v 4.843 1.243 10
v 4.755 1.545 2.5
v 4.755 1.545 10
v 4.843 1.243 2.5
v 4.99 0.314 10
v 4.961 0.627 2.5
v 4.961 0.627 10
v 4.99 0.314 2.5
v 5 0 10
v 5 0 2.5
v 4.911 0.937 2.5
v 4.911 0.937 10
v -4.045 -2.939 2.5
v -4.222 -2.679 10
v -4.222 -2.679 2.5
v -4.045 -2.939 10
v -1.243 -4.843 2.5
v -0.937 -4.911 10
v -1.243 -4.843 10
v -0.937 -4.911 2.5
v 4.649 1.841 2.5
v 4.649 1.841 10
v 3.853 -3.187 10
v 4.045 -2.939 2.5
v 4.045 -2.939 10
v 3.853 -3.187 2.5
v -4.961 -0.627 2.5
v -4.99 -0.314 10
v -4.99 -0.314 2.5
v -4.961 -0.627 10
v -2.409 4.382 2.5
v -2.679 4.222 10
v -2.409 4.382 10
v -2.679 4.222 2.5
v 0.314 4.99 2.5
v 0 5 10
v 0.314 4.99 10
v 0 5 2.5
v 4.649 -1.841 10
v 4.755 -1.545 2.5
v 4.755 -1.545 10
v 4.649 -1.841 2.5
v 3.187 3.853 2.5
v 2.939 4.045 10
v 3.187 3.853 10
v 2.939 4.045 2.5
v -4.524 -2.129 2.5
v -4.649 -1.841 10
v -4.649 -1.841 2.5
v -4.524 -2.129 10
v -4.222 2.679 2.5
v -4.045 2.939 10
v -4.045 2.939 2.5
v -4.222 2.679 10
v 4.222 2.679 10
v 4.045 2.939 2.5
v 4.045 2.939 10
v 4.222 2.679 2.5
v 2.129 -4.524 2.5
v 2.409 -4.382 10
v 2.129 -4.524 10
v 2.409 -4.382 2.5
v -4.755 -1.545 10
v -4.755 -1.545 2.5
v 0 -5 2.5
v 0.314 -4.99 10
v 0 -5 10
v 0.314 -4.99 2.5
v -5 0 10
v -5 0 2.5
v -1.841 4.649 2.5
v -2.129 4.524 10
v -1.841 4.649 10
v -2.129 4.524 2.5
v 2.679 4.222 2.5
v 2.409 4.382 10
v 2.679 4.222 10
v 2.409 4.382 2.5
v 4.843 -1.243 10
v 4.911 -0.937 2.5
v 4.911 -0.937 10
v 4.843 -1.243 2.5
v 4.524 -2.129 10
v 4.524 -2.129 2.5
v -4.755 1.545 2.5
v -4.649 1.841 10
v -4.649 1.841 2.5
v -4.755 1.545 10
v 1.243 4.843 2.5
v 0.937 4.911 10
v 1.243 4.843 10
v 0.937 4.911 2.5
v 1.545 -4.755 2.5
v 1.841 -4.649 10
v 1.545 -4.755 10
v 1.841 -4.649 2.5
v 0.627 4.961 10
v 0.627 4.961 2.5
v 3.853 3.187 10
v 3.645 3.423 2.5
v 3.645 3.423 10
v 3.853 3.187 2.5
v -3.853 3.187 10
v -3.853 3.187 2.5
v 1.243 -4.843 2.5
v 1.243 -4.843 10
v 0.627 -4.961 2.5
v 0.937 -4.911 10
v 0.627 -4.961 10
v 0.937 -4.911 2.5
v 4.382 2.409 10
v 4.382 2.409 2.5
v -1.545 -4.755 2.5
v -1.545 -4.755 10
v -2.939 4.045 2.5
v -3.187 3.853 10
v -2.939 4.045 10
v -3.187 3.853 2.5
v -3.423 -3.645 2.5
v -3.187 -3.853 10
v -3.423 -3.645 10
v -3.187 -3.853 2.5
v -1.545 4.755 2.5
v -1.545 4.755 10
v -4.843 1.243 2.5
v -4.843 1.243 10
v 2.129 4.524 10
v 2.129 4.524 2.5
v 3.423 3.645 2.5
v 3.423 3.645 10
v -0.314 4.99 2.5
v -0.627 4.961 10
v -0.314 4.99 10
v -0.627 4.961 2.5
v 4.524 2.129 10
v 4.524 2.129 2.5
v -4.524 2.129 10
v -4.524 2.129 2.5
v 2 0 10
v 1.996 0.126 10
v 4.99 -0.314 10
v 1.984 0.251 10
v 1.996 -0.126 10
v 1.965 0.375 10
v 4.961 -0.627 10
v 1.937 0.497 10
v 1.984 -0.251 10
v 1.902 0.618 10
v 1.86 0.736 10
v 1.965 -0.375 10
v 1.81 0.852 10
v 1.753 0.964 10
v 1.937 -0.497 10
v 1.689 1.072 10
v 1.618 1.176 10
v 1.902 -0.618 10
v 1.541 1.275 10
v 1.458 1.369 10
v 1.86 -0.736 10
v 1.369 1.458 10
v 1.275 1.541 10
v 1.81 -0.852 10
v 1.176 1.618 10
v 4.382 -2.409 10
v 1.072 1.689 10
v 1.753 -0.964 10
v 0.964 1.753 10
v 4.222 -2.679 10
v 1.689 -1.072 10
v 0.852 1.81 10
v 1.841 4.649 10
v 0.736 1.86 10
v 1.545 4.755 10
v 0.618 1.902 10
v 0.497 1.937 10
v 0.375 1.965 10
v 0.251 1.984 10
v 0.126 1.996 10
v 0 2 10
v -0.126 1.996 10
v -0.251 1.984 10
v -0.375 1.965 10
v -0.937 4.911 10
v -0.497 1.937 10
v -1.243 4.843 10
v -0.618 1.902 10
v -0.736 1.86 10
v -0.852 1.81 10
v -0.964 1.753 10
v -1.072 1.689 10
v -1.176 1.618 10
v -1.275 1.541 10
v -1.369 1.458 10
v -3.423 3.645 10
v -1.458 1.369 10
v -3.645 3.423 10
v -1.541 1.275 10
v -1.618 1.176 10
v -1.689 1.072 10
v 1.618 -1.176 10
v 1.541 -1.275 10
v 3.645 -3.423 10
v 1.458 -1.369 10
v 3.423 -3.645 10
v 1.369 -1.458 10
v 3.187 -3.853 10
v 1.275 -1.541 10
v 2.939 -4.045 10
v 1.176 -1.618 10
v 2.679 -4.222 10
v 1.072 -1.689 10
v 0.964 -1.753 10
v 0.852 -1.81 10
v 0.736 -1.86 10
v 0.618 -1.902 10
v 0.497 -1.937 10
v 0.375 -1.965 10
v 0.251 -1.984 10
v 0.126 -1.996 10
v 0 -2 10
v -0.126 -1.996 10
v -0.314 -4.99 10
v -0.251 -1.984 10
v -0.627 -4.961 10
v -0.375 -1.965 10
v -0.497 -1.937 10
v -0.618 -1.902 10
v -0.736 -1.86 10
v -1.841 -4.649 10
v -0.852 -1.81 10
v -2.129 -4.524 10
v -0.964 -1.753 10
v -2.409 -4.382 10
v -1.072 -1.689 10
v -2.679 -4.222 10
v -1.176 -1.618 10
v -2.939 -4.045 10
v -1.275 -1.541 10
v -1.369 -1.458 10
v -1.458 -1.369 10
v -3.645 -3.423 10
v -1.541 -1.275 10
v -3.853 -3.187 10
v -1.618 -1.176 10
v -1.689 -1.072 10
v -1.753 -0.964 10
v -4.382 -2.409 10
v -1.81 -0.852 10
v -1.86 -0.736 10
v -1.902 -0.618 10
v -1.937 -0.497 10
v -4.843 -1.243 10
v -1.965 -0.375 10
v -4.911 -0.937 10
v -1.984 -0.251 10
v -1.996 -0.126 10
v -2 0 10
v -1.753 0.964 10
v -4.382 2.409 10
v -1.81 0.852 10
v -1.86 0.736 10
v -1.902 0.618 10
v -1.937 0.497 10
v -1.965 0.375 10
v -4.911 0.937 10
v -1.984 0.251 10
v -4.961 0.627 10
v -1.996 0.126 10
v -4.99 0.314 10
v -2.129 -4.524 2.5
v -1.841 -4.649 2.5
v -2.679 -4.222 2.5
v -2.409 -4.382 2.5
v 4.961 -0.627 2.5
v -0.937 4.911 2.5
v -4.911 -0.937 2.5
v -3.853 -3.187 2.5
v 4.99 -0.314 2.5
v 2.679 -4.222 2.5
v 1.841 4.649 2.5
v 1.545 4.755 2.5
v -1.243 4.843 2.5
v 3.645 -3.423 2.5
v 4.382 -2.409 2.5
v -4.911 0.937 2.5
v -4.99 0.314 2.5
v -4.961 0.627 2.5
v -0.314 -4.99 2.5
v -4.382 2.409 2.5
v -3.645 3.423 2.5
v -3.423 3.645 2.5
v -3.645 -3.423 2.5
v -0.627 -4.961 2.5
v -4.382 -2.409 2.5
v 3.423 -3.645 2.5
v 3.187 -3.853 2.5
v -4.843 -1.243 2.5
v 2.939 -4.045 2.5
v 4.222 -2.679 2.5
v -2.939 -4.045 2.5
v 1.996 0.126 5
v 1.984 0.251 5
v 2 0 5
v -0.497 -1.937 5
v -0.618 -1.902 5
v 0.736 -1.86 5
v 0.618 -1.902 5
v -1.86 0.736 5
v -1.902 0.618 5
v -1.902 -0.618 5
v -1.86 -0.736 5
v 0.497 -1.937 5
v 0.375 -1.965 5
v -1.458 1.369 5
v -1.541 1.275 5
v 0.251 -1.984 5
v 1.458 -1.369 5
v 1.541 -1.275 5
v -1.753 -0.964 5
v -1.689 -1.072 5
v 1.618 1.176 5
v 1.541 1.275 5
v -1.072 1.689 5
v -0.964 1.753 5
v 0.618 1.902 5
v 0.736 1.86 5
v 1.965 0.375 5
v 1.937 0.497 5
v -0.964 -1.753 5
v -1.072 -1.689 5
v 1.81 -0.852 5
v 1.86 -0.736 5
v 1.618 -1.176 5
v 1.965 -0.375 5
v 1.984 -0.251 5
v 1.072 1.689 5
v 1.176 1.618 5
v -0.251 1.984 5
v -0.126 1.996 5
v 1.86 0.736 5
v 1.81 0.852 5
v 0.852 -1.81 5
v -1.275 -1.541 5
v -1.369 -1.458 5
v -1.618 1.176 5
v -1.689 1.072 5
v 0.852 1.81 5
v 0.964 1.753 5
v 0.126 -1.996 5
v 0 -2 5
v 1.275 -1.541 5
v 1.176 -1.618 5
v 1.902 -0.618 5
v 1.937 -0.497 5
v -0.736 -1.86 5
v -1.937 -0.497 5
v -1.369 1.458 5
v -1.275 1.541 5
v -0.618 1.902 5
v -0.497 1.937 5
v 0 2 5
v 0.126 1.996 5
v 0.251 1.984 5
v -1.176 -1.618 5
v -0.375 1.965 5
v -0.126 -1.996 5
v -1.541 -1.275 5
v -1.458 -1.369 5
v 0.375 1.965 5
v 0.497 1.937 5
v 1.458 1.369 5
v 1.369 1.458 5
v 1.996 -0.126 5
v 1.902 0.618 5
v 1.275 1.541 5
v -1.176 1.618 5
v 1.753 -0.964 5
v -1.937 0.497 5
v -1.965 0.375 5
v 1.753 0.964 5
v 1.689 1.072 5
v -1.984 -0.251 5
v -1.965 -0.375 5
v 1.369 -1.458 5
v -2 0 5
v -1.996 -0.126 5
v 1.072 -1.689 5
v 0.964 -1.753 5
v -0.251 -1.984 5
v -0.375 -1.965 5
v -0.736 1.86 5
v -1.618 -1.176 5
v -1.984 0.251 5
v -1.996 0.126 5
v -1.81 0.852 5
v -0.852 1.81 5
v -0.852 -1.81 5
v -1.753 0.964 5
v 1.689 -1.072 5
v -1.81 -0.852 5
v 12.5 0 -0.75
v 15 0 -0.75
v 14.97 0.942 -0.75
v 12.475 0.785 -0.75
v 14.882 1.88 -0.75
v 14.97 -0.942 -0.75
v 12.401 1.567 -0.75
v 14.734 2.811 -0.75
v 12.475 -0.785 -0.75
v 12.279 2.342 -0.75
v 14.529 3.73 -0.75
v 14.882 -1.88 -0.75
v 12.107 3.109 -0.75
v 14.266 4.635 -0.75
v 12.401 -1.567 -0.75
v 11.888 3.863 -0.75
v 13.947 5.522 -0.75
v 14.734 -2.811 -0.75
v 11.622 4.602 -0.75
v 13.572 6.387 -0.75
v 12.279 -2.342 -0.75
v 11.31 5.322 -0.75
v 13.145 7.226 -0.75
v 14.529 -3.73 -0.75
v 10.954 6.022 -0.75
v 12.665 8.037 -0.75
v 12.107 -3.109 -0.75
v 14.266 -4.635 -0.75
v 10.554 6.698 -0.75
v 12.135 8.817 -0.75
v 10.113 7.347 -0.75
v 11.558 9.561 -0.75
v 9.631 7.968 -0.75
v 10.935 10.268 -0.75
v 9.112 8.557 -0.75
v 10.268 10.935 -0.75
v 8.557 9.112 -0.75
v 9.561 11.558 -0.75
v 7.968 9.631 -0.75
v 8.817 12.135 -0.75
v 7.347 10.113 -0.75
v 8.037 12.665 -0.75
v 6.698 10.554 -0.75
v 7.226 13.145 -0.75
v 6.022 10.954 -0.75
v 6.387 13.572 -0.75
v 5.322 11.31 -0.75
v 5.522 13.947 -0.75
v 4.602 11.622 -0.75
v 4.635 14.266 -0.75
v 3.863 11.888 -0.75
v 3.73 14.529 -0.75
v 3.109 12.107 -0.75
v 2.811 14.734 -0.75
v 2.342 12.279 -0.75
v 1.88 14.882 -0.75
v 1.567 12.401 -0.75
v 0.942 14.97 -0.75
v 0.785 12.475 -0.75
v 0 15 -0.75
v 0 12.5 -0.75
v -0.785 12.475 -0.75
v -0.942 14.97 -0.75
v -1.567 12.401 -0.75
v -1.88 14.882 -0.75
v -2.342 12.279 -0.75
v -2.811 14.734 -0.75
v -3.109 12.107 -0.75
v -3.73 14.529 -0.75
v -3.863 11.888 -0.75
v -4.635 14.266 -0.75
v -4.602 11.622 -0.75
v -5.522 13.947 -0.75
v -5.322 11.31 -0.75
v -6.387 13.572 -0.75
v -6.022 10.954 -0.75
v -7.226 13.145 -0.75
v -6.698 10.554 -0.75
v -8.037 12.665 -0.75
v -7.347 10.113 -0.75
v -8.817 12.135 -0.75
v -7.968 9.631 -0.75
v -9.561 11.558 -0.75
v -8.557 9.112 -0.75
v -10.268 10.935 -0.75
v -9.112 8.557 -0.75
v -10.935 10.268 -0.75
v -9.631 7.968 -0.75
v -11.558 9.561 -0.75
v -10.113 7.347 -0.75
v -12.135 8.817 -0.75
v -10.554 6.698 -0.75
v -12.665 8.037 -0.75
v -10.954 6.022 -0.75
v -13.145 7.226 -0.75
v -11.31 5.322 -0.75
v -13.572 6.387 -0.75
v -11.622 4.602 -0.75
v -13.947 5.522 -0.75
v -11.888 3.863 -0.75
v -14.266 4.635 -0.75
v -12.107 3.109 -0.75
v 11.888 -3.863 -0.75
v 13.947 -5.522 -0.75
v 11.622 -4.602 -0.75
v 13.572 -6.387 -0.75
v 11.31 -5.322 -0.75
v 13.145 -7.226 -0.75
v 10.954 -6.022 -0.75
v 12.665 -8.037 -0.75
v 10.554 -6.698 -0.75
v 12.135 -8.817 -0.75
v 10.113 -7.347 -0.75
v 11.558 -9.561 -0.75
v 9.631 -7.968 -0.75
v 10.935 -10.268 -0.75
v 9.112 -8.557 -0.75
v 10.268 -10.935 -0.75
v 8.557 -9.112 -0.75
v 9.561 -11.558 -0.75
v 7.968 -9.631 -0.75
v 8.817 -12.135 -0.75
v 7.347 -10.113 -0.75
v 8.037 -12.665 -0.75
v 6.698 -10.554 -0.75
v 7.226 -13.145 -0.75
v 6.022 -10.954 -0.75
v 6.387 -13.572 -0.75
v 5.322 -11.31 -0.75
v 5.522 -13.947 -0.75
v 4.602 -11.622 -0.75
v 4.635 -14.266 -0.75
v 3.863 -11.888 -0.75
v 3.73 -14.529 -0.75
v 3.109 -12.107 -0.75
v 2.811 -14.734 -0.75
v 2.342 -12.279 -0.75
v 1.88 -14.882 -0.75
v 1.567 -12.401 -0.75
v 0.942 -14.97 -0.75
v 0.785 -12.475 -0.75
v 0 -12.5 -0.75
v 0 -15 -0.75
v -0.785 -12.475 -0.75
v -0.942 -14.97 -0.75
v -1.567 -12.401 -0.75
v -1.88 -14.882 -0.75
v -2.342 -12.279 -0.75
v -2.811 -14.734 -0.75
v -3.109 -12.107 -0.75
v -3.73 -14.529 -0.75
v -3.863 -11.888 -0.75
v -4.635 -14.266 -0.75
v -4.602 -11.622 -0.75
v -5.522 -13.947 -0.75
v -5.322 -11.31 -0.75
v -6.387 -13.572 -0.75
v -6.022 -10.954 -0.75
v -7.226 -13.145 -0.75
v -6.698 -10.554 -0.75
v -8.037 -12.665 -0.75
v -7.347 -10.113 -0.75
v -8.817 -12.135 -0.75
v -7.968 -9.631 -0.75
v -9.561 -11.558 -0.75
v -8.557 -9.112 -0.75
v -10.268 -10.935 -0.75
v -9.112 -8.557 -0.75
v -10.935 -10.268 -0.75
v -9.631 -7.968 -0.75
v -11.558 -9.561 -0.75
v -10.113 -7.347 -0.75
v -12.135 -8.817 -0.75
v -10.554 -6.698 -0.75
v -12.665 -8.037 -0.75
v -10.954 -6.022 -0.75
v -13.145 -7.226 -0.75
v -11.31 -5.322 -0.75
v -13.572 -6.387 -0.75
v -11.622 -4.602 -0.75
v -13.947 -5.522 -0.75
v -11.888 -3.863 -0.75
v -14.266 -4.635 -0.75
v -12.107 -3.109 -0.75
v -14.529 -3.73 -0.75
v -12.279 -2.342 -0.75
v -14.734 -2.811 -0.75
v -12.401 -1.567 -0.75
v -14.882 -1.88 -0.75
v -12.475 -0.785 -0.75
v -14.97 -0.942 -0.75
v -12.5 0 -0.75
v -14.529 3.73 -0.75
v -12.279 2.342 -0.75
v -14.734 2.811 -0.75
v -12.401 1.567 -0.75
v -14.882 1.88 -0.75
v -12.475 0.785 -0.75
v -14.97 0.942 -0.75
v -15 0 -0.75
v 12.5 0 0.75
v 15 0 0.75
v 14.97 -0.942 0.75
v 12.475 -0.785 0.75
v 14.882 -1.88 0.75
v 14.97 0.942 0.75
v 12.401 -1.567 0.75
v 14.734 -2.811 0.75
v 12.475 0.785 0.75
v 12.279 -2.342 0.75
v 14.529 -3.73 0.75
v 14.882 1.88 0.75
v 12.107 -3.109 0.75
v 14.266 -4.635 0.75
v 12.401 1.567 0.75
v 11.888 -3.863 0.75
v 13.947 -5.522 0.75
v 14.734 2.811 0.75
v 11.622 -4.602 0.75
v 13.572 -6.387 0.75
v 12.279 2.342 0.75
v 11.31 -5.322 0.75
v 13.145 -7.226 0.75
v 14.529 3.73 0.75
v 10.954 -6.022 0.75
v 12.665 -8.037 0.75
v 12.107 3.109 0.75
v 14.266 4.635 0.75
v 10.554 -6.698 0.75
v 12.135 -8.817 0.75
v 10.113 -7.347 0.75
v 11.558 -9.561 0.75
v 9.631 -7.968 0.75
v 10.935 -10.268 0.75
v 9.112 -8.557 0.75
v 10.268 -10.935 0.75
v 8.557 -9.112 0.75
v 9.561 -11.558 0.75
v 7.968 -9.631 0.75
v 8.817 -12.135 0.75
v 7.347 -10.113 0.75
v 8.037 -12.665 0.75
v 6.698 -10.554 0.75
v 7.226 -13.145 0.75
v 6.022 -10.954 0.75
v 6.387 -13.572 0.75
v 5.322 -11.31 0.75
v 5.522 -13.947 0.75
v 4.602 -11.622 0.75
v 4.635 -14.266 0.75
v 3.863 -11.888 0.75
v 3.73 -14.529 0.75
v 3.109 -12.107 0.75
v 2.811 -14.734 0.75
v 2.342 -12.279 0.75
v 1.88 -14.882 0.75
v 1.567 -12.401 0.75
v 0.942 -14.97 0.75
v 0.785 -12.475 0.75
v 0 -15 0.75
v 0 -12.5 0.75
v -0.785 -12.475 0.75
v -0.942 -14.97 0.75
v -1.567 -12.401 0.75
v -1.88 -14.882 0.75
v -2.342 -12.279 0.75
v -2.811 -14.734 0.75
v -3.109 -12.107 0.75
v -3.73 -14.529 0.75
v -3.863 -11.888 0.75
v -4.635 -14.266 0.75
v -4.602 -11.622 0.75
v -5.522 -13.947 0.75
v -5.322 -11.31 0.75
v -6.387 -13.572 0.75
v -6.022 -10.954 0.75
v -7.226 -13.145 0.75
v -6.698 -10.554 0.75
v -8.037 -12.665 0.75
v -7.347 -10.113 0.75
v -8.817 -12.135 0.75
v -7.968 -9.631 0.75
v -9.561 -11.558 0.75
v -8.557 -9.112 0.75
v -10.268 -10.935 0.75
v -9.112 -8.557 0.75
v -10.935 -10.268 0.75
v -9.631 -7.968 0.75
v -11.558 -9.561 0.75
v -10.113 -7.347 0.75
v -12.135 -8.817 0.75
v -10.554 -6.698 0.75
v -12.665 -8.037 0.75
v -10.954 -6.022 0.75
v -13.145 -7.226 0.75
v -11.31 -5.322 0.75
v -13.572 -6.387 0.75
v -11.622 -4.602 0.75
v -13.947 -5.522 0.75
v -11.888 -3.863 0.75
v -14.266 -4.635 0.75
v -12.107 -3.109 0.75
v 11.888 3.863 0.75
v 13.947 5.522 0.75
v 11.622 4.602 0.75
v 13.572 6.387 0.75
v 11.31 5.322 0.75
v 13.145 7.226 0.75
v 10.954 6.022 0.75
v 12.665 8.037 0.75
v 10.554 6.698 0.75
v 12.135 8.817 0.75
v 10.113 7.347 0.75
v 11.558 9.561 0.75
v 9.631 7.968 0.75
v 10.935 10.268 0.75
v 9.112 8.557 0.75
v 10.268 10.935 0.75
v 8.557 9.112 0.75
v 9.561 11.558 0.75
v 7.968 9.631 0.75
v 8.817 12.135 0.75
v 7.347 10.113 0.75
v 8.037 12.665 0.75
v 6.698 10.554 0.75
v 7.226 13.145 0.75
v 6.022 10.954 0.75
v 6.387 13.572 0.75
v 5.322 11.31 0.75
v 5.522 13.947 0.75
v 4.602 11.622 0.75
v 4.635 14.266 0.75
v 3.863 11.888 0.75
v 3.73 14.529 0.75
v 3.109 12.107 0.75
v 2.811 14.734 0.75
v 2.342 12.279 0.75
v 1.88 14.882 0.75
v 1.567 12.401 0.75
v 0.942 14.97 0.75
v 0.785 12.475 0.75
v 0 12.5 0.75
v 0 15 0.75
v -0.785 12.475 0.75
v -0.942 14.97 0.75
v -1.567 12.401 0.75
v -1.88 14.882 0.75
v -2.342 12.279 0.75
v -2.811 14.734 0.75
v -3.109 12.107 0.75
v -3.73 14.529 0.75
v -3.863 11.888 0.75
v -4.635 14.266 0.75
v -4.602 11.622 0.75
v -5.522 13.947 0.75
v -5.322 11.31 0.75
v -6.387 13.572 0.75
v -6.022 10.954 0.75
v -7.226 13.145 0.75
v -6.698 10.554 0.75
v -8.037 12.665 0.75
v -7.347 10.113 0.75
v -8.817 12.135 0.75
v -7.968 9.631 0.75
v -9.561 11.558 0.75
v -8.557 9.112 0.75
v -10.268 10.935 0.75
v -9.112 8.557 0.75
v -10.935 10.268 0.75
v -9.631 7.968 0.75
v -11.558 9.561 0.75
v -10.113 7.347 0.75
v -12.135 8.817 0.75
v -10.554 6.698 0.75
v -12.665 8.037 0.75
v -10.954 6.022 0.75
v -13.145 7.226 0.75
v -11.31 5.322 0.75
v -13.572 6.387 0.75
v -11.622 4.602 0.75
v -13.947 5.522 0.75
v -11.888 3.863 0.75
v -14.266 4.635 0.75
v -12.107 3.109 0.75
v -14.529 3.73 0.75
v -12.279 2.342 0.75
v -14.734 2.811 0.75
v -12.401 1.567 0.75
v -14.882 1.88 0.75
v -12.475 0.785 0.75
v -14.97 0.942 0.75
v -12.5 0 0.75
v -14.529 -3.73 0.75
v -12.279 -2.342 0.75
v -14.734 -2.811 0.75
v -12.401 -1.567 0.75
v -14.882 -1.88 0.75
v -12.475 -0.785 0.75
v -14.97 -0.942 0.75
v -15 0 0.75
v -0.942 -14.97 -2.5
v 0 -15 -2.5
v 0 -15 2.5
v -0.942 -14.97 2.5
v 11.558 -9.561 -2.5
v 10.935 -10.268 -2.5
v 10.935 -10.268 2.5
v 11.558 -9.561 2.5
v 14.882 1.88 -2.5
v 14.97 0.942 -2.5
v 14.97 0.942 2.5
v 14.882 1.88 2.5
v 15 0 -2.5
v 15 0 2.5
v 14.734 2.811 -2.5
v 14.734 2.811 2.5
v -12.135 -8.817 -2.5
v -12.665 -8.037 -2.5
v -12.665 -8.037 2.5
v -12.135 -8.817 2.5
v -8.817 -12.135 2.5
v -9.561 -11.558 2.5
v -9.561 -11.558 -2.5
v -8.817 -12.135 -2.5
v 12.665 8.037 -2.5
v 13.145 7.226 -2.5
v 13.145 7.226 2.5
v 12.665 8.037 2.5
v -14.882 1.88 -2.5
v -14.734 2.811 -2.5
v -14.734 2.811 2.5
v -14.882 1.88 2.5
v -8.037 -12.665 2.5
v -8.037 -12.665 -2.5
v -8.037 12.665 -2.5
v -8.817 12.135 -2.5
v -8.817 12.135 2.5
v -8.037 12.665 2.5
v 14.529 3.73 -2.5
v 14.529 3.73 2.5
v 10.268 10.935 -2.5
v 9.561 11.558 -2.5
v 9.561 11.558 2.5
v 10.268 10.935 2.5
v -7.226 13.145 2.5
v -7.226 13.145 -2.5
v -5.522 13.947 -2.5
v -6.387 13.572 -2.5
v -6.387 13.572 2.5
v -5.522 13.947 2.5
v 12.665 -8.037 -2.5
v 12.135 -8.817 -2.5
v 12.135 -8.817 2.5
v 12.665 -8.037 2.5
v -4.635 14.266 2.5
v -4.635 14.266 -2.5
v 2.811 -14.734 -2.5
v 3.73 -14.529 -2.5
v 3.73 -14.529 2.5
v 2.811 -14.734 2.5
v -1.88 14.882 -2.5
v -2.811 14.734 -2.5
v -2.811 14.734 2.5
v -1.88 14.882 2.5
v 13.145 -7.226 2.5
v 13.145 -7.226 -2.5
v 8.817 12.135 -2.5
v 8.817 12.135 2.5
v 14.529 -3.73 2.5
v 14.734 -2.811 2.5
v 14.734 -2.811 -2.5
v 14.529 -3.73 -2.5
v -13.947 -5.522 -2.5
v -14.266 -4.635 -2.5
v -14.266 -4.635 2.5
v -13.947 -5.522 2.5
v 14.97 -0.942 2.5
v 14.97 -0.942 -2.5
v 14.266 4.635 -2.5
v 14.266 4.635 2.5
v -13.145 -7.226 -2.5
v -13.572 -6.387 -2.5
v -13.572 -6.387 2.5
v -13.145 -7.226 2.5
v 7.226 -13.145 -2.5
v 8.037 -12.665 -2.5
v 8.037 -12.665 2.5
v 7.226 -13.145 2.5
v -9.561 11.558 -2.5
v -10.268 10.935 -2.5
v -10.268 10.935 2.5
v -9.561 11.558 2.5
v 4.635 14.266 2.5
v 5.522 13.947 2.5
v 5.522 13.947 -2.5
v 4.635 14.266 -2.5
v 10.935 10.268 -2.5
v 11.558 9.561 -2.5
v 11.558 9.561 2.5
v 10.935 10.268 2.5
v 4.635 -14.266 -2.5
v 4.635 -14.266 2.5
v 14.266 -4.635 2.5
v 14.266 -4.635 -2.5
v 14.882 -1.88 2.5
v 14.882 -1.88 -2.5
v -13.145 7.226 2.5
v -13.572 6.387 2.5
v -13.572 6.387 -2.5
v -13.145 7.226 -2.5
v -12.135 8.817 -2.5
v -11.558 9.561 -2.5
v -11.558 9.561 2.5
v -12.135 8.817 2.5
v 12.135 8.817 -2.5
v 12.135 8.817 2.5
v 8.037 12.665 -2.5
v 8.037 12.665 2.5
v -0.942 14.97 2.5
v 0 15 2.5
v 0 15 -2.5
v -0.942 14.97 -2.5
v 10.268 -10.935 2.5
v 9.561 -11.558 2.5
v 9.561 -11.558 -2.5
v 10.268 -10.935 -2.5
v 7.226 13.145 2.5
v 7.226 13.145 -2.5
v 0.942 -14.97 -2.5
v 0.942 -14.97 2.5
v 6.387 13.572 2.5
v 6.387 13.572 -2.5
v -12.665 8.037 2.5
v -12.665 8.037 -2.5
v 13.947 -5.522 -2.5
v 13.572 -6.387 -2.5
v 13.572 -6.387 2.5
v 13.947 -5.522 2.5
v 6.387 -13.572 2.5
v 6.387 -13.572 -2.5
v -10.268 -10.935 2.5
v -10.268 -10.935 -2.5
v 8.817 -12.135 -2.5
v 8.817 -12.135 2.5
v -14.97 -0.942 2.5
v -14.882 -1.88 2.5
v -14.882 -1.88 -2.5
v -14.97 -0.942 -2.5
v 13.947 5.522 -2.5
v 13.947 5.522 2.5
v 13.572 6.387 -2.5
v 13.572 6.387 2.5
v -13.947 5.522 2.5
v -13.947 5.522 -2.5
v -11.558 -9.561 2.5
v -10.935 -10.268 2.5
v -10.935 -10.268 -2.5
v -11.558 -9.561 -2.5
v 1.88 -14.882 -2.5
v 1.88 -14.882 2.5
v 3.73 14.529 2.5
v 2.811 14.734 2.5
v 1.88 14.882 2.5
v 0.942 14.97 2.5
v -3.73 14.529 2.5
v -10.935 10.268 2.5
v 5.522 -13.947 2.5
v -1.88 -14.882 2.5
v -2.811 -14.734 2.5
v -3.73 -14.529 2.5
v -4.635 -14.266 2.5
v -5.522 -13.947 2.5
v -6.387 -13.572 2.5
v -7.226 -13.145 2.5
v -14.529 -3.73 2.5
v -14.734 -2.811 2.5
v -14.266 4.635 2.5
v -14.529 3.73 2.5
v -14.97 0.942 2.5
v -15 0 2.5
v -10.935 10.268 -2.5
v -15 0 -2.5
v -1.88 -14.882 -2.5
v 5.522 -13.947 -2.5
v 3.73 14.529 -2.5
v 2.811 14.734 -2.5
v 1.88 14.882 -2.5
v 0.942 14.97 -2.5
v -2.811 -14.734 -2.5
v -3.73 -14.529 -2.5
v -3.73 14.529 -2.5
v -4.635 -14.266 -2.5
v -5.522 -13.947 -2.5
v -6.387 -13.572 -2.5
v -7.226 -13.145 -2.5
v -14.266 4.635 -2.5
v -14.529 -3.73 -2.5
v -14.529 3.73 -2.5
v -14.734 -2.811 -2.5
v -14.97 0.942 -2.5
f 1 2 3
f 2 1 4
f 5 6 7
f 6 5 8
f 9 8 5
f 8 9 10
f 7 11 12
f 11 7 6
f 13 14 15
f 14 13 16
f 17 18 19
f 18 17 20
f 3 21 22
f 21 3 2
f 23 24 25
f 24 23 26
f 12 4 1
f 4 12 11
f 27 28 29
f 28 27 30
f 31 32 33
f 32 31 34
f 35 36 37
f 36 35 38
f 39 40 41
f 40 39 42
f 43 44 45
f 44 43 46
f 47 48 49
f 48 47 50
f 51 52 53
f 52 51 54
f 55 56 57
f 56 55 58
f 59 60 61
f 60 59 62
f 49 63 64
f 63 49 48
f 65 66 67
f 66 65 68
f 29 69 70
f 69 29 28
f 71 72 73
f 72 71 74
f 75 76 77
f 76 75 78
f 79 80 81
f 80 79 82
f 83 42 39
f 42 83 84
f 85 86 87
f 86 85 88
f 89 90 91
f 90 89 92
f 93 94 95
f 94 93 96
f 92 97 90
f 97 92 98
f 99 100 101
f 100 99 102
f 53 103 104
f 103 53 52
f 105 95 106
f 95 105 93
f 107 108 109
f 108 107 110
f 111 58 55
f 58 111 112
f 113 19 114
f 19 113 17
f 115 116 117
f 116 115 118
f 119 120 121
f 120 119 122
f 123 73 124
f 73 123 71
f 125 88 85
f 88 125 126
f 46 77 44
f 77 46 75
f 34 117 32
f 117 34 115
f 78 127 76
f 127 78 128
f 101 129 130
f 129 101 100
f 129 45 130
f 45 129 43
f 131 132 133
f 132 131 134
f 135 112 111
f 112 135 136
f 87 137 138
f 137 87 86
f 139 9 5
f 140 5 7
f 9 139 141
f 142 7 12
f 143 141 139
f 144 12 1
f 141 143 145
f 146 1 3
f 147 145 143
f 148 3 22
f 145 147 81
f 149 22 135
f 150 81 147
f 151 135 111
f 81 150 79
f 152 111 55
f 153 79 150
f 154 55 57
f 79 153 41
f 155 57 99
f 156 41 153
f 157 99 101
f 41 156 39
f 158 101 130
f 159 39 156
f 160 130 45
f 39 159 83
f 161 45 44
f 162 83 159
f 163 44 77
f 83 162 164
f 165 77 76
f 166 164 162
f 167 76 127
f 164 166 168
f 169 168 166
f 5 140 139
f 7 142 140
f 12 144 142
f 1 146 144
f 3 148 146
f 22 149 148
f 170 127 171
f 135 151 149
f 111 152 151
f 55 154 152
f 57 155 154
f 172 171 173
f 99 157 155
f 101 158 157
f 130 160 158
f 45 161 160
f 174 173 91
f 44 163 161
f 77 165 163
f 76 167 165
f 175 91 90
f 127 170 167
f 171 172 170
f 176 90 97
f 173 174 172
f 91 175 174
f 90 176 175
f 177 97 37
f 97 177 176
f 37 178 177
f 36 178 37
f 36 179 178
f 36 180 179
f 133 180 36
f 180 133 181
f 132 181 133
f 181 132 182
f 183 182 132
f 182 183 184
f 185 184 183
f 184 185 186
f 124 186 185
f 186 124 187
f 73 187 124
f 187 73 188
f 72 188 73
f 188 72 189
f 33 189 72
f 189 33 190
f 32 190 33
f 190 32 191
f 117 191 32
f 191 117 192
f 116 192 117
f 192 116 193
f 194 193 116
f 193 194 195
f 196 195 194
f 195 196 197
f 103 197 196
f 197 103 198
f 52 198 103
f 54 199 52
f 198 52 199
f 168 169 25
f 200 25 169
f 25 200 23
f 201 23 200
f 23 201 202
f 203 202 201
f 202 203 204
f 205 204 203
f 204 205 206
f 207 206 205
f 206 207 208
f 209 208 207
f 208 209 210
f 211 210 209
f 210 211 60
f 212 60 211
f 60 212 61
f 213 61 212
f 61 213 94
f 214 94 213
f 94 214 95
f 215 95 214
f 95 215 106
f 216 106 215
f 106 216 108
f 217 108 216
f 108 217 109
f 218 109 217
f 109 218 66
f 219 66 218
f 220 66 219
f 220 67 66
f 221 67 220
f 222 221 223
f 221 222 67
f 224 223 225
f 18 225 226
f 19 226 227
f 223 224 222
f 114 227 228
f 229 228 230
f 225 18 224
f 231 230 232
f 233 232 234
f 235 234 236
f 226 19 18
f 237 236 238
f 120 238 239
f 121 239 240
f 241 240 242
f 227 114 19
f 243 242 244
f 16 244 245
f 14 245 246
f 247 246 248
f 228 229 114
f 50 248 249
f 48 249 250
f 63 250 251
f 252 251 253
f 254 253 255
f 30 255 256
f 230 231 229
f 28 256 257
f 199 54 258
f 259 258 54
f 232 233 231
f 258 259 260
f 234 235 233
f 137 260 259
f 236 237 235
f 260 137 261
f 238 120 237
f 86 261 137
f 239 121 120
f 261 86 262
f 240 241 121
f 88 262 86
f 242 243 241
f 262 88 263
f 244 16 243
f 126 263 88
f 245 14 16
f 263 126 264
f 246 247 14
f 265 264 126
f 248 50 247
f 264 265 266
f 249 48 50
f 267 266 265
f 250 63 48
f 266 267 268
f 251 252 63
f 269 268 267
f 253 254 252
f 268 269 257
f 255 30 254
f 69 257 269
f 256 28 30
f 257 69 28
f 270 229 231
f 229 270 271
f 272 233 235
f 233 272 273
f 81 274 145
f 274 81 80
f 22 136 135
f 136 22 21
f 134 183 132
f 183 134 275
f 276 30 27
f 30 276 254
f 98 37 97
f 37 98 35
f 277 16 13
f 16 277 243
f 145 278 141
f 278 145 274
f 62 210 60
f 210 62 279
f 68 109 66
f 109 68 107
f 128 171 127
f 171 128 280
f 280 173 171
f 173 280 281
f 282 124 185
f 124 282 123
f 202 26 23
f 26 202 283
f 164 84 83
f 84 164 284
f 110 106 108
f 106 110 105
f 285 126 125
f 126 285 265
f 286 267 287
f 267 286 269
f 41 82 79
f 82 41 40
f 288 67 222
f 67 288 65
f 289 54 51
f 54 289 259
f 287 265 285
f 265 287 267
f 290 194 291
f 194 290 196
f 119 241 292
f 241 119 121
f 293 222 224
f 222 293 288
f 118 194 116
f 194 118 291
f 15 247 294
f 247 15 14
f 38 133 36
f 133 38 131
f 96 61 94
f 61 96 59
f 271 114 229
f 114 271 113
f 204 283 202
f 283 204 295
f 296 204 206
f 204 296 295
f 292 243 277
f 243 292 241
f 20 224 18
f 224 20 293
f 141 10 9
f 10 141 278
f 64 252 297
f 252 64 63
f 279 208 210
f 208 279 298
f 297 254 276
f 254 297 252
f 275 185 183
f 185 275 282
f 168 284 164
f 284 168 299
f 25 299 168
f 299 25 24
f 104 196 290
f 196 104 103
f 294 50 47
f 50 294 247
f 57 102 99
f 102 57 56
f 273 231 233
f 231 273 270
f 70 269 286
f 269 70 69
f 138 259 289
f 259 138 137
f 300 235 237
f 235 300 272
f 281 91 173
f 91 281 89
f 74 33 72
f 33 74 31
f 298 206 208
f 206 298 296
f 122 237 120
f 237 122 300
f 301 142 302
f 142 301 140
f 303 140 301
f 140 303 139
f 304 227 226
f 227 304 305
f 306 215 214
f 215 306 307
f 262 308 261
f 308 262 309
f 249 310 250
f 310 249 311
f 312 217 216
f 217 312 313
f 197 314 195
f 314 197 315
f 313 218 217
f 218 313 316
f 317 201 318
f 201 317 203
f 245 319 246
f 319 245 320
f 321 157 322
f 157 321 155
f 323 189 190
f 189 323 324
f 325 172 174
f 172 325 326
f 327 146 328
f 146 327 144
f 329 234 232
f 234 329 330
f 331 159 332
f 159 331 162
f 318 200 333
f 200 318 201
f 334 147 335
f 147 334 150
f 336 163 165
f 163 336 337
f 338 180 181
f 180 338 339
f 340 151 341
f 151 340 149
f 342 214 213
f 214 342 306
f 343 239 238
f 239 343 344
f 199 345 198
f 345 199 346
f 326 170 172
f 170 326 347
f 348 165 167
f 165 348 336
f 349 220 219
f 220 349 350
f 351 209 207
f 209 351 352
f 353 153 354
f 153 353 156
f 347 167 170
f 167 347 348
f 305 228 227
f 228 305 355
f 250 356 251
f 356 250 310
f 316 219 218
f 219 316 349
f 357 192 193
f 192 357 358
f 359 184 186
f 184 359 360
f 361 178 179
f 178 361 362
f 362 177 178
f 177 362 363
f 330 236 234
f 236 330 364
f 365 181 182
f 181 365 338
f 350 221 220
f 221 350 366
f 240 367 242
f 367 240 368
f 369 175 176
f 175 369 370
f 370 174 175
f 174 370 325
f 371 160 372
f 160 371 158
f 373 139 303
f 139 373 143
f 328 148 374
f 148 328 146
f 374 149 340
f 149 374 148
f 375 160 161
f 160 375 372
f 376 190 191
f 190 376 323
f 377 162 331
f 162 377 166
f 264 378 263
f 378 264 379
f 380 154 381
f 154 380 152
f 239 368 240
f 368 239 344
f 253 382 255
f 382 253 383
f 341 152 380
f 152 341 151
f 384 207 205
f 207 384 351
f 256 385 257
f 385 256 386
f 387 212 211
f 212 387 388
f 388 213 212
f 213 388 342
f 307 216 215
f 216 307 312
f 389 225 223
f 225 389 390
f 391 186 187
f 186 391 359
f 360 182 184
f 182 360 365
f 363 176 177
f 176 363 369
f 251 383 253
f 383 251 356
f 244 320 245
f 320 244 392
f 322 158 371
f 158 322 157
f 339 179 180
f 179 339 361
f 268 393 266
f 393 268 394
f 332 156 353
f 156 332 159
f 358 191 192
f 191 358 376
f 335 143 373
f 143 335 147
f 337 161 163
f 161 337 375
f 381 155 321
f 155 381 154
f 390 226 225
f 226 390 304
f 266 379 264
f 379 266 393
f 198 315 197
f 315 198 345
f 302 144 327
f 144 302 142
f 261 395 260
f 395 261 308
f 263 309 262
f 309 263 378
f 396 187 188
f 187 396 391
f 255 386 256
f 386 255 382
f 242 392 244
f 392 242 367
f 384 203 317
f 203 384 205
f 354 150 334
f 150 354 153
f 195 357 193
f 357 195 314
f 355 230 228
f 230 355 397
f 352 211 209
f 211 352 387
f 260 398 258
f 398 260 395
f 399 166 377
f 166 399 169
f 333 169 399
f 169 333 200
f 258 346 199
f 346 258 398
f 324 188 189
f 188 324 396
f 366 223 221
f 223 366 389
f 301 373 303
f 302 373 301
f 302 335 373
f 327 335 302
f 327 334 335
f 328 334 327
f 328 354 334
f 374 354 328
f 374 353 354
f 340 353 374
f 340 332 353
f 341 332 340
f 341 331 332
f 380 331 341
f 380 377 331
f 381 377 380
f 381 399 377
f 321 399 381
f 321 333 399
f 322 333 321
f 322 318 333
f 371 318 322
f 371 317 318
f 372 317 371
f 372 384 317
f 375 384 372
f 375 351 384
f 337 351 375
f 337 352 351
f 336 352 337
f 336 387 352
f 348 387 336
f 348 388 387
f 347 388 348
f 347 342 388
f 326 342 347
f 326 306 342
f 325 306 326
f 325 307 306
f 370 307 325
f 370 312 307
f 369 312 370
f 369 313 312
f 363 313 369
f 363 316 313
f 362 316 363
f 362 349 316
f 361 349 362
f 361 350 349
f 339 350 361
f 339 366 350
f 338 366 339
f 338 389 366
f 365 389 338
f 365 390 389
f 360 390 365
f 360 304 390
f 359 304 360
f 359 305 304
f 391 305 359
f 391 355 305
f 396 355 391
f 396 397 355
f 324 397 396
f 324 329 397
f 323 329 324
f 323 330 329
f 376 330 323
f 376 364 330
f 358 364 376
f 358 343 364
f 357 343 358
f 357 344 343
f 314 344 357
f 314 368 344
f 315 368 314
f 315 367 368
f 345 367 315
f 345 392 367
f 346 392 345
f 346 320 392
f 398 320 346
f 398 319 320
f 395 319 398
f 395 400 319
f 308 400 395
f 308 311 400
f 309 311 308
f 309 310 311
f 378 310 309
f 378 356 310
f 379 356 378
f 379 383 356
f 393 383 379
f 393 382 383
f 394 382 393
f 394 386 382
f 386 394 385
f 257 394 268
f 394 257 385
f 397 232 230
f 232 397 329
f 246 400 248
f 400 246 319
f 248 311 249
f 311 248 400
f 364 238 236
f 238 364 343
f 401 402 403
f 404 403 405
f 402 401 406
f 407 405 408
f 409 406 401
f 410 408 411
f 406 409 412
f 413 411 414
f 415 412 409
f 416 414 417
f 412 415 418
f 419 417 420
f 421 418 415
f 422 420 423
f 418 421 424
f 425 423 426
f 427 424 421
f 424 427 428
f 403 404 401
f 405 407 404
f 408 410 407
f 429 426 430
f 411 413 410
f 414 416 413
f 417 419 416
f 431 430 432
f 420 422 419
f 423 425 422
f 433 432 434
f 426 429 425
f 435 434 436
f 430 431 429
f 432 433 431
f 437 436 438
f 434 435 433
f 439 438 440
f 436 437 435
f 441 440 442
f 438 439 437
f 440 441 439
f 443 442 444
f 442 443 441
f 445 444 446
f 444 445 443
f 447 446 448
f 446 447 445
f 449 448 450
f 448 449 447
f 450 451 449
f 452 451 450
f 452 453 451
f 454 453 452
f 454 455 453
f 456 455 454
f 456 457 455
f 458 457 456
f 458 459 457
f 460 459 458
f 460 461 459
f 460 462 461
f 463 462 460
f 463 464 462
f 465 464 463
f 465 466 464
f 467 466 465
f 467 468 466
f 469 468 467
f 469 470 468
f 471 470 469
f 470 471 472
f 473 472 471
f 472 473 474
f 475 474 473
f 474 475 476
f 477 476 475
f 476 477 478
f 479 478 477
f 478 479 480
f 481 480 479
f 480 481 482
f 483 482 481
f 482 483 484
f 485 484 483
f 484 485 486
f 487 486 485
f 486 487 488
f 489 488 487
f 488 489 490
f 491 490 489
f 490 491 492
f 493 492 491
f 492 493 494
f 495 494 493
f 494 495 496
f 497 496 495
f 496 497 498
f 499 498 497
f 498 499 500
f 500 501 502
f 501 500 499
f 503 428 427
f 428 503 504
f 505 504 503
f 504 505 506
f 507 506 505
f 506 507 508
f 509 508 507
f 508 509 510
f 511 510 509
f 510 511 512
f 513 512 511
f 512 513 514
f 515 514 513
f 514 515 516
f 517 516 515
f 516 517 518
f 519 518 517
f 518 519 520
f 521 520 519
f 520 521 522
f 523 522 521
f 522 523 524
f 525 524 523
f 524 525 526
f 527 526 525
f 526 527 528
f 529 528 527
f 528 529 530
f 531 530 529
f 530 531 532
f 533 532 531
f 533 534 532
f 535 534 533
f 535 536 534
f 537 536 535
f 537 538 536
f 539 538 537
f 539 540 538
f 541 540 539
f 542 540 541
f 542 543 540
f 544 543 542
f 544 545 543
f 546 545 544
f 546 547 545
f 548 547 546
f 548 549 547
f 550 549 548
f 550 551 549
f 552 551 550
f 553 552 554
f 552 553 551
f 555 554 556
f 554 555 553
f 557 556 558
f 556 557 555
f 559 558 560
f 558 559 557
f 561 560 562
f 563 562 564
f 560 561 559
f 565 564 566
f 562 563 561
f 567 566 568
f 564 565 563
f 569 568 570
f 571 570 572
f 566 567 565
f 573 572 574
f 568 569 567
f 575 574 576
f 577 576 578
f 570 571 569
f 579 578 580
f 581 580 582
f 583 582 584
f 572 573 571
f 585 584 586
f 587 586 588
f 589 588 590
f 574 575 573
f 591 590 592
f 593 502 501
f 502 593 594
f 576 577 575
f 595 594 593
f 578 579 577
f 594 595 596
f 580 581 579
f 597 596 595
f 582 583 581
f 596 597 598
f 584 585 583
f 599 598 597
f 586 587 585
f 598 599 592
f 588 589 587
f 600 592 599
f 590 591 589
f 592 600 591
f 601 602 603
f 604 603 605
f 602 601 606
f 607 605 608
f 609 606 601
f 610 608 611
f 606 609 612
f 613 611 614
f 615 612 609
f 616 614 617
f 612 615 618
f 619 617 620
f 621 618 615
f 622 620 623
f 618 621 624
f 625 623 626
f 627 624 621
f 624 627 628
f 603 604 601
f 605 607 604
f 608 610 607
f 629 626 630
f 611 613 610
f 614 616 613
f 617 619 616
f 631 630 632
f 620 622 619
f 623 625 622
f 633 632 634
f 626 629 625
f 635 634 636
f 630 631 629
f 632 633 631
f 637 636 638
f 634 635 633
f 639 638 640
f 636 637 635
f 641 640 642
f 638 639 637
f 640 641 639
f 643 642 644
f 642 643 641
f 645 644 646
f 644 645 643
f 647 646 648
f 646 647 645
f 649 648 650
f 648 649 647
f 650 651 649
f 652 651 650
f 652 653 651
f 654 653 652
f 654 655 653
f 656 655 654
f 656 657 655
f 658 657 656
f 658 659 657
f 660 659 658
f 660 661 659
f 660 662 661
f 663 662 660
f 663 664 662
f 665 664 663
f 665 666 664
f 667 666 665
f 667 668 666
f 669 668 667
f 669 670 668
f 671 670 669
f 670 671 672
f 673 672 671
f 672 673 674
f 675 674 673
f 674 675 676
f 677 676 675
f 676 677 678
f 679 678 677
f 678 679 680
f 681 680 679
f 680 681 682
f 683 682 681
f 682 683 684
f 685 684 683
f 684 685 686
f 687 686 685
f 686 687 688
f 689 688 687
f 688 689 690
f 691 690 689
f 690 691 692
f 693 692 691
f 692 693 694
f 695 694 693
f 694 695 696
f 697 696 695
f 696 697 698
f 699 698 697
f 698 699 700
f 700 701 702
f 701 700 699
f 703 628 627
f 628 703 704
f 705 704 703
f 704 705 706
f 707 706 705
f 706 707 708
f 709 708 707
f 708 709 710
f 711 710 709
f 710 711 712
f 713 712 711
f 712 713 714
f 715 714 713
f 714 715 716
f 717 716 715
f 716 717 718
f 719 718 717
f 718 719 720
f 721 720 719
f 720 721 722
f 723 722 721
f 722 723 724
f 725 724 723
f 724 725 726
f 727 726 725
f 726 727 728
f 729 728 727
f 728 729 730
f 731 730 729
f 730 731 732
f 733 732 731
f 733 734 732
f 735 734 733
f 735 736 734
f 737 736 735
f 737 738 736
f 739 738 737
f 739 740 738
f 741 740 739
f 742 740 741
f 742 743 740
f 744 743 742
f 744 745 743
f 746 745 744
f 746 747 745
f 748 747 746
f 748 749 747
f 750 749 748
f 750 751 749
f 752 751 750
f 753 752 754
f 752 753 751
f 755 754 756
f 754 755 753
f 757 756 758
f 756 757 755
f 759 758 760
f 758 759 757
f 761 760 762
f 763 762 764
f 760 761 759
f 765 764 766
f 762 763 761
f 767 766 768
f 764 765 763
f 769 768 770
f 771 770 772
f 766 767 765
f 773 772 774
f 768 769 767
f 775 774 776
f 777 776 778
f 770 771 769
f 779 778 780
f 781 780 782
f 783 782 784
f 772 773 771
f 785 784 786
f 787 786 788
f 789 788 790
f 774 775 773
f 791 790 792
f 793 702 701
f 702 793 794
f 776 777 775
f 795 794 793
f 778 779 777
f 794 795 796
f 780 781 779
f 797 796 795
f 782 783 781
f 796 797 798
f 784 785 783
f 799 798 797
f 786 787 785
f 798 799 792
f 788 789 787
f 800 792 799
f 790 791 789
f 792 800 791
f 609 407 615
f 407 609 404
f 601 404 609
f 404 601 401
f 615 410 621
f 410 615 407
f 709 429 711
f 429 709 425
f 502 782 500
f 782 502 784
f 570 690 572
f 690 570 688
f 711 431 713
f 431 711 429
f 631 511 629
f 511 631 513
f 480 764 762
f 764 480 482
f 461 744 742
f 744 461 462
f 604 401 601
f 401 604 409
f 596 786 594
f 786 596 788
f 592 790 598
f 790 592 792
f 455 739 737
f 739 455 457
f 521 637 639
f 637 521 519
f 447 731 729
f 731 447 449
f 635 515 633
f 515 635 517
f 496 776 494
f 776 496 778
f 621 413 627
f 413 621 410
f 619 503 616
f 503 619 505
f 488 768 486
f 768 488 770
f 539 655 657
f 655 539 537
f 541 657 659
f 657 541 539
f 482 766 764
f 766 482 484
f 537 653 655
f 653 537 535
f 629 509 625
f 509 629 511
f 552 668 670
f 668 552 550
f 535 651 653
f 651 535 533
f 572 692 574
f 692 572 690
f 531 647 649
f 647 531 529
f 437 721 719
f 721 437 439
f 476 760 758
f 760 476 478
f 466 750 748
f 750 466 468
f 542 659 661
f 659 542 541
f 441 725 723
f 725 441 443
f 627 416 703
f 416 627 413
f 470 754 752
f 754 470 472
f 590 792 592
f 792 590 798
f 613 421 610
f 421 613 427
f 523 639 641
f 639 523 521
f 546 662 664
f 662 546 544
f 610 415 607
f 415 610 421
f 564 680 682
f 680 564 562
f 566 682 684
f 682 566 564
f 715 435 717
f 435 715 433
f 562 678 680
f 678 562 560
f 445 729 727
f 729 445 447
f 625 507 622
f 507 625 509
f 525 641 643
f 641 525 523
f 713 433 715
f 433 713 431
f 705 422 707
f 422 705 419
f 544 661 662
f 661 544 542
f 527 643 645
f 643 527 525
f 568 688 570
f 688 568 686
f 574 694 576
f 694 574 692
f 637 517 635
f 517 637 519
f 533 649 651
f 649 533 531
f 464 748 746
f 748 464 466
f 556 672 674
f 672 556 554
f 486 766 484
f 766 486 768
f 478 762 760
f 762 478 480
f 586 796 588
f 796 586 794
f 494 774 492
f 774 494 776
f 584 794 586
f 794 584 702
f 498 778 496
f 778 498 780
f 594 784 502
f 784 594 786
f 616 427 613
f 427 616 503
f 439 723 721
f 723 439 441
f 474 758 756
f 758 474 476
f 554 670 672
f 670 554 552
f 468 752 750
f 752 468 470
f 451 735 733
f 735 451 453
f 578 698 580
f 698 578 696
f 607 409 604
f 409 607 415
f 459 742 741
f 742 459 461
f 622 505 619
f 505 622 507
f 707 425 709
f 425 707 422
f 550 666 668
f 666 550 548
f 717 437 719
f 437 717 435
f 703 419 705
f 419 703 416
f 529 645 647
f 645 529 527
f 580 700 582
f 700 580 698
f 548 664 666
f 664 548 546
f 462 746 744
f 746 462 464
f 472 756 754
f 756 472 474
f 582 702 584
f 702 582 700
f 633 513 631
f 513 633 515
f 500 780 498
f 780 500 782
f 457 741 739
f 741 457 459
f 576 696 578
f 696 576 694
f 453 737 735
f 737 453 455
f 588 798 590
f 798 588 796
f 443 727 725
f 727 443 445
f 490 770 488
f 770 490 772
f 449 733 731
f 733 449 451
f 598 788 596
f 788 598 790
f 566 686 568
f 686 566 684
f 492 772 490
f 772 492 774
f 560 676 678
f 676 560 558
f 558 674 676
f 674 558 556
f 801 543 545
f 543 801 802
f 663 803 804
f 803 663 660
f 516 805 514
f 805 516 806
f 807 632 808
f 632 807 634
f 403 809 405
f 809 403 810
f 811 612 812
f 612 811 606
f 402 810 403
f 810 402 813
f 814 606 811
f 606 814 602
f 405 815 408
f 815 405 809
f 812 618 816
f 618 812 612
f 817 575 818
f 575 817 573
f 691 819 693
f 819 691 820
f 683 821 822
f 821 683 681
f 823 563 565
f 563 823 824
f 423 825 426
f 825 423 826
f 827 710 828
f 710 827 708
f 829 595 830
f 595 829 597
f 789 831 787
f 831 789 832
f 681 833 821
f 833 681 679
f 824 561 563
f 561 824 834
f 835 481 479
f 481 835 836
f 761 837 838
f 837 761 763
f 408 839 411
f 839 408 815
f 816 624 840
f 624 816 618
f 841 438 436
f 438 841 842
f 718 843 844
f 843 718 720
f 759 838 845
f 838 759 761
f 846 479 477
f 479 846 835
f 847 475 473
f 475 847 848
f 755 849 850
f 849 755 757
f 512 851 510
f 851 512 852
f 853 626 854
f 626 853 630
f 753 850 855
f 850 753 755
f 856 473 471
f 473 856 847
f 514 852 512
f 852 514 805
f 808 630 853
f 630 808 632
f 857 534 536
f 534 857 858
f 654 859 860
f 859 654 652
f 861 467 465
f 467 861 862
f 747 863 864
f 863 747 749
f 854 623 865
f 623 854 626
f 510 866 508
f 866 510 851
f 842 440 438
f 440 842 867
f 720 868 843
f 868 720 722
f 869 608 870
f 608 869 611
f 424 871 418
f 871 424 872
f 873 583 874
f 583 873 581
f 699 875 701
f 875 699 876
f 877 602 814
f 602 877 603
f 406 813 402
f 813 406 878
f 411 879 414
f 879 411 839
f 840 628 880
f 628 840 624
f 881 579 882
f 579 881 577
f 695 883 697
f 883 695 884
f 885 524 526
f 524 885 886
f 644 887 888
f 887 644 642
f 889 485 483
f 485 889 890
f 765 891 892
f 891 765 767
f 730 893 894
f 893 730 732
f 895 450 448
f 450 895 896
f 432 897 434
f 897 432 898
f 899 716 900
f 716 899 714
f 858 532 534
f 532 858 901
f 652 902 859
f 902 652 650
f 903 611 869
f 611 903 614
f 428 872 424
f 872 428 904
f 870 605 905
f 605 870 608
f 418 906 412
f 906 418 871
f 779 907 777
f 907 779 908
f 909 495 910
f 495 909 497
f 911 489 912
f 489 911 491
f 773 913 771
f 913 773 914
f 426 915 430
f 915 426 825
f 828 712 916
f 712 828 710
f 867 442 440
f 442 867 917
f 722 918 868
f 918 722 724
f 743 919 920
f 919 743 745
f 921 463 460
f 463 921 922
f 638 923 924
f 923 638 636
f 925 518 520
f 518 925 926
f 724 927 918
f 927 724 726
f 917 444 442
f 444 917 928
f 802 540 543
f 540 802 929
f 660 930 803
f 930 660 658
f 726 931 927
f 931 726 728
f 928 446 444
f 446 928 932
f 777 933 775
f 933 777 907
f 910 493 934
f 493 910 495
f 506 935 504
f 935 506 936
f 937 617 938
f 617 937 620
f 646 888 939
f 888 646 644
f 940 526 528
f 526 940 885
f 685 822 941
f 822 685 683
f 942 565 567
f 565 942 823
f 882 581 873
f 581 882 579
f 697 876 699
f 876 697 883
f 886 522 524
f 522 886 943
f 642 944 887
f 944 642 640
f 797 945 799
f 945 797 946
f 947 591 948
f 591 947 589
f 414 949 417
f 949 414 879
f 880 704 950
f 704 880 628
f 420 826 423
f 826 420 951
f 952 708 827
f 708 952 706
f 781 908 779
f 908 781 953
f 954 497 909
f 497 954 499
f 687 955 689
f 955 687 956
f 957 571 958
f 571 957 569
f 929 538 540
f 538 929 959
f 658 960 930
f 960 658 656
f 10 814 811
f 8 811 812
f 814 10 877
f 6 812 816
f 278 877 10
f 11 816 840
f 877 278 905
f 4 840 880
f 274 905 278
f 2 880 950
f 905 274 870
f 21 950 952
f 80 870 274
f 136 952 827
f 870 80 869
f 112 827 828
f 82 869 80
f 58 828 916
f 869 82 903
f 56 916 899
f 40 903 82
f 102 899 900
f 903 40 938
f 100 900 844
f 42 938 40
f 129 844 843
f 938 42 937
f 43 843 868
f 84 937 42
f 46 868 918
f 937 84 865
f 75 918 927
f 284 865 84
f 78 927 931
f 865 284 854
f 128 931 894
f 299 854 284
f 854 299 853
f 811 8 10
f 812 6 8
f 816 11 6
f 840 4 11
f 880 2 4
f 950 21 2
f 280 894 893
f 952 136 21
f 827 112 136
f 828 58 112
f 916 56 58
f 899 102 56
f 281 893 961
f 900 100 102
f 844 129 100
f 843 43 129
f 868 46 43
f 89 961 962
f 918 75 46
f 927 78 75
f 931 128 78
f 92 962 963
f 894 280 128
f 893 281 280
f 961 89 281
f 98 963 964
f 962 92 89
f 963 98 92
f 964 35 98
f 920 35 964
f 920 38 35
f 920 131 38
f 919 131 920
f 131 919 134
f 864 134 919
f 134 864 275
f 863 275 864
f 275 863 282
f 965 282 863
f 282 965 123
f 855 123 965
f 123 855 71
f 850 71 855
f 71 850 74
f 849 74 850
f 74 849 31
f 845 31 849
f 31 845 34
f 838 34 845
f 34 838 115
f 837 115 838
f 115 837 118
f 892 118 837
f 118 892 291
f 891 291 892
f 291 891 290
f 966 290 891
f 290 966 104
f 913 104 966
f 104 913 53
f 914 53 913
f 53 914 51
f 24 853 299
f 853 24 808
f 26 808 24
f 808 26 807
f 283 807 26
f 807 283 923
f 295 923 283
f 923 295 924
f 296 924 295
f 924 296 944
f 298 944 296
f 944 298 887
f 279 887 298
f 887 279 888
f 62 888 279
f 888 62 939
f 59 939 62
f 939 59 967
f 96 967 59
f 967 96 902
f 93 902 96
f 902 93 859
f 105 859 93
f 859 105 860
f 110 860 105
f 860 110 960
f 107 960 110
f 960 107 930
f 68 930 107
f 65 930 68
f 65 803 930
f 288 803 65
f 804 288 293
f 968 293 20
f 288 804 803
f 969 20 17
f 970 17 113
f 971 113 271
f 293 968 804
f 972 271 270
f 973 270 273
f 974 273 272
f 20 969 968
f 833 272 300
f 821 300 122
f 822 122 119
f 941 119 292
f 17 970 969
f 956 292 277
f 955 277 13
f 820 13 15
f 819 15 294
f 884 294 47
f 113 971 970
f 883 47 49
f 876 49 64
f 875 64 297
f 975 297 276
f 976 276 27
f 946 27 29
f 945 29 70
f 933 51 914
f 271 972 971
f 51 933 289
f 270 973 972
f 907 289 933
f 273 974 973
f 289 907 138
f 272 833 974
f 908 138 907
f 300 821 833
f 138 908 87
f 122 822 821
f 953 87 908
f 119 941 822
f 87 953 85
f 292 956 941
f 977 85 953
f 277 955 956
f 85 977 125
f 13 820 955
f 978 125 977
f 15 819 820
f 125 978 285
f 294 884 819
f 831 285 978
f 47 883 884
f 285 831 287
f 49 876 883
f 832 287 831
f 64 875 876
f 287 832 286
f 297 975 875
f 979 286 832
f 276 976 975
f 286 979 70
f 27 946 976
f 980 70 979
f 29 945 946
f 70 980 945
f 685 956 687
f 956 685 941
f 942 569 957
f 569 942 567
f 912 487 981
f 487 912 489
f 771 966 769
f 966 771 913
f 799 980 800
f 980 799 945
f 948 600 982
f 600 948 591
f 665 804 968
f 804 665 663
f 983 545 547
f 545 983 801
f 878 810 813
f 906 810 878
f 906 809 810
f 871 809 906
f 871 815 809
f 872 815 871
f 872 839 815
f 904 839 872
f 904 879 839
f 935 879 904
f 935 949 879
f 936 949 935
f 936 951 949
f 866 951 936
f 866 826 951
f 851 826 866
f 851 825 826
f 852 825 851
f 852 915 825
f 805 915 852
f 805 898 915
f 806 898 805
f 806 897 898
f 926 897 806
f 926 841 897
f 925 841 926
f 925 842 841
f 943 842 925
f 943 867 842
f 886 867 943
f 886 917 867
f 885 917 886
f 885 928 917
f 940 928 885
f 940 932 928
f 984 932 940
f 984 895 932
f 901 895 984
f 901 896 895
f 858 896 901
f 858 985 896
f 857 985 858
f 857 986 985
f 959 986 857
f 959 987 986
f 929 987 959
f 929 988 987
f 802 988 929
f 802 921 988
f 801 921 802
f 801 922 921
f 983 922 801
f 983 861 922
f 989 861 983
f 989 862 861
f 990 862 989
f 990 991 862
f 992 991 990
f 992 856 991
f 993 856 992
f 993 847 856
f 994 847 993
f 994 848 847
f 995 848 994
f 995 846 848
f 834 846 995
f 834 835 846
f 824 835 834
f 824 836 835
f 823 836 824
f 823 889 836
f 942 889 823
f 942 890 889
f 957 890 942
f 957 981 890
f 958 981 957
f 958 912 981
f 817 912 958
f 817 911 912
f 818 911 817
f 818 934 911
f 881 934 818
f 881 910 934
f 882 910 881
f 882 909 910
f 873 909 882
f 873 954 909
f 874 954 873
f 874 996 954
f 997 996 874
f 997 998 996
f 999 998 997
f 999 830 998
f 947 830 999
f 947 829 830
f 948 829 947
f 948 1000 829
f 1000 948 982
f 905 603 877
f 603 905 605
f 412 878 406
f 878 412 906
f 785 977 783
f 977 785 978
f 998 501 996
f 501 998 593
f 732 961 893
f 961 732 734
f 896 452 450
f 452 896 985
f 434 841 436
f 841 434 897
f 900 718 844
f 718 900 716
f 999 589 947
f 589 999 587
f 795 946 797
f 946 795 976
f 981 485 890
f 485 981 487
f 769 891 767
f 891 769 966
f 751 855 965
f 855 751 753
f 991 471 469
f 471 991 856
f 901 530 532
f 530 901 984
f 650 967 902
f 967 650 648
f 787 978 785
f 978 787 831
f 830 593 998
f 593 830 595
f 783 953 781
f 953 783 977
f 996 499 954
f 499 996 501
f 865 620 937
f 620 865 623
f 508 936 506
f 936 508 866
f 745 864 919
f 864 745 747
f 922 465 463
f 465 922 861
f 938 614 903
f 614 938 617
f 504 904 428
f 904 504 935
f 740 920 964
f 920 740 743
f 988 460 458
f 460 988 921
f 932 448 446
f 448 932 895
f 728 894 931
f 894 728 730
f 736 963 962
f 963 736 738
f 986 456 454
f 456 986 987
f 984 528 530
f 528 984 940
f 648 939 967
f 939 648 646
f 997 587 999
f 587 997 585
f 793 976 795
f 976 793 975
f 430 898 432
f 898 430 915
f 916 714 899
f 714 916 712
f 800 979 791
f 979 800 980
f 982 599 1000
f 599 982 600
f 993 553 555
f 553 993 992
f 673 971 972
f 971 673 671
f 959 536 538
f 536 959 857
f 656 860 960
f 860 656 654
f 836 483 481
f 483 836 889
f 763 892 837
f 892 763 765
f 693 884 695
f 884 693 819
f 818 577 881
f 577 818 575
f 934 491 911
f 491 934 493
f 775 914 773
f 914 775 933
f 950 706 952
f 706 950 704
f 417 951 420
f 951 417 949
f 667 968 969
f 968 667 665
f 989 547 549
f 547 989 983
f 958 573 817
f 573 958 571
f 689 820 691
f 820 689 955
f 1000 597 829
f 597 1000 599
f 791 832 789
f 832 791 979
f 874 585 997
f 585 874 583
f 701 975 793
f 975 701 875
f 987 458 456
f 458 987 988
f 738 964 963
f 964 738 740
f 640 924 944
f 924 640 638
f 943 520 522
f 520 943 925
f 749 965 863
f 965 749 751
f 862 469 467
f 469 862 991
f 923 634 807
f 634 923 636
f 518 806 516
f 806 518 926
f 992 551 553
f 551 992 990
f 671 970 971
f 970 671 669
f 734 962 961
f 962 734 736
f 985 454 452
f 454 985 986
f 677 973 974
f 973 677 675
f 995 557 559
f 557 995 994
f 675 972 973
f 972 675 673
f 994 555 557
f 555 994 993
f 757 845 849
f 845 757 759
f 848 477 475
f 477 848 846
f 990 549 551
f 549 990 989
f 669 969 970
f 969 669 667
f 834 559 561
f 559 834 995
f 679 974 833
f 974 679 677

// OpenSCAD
/*
 * Date: 16/08/2016
 * Vers:   1.1.0
 *
 * Description:  
 *             this file generate the front wheel. 
 *
 * Note:   - first release
 *          
 *         
 * Originally by Matteo Saccaro, 2016.
 * Attribution-Share Alike 3.0
 * 
*/ 



module wheel_front(){   
difference(){
 cylinder(r=5,h=10,$fn=100);
 translate([0,0,5]) cylinder(r=2,h=10,$fn=100);
}
difference(){
  cylinder(r=15,h=5,$fn=100,center=true);
	difference(){
	  cylinder(r=25,h=1.5,$fn=100,center=true);
	  cylinder(r=12.5,h=1.5,$fn=100,center=true);
	
	}
	
}

}


wheel_front();
